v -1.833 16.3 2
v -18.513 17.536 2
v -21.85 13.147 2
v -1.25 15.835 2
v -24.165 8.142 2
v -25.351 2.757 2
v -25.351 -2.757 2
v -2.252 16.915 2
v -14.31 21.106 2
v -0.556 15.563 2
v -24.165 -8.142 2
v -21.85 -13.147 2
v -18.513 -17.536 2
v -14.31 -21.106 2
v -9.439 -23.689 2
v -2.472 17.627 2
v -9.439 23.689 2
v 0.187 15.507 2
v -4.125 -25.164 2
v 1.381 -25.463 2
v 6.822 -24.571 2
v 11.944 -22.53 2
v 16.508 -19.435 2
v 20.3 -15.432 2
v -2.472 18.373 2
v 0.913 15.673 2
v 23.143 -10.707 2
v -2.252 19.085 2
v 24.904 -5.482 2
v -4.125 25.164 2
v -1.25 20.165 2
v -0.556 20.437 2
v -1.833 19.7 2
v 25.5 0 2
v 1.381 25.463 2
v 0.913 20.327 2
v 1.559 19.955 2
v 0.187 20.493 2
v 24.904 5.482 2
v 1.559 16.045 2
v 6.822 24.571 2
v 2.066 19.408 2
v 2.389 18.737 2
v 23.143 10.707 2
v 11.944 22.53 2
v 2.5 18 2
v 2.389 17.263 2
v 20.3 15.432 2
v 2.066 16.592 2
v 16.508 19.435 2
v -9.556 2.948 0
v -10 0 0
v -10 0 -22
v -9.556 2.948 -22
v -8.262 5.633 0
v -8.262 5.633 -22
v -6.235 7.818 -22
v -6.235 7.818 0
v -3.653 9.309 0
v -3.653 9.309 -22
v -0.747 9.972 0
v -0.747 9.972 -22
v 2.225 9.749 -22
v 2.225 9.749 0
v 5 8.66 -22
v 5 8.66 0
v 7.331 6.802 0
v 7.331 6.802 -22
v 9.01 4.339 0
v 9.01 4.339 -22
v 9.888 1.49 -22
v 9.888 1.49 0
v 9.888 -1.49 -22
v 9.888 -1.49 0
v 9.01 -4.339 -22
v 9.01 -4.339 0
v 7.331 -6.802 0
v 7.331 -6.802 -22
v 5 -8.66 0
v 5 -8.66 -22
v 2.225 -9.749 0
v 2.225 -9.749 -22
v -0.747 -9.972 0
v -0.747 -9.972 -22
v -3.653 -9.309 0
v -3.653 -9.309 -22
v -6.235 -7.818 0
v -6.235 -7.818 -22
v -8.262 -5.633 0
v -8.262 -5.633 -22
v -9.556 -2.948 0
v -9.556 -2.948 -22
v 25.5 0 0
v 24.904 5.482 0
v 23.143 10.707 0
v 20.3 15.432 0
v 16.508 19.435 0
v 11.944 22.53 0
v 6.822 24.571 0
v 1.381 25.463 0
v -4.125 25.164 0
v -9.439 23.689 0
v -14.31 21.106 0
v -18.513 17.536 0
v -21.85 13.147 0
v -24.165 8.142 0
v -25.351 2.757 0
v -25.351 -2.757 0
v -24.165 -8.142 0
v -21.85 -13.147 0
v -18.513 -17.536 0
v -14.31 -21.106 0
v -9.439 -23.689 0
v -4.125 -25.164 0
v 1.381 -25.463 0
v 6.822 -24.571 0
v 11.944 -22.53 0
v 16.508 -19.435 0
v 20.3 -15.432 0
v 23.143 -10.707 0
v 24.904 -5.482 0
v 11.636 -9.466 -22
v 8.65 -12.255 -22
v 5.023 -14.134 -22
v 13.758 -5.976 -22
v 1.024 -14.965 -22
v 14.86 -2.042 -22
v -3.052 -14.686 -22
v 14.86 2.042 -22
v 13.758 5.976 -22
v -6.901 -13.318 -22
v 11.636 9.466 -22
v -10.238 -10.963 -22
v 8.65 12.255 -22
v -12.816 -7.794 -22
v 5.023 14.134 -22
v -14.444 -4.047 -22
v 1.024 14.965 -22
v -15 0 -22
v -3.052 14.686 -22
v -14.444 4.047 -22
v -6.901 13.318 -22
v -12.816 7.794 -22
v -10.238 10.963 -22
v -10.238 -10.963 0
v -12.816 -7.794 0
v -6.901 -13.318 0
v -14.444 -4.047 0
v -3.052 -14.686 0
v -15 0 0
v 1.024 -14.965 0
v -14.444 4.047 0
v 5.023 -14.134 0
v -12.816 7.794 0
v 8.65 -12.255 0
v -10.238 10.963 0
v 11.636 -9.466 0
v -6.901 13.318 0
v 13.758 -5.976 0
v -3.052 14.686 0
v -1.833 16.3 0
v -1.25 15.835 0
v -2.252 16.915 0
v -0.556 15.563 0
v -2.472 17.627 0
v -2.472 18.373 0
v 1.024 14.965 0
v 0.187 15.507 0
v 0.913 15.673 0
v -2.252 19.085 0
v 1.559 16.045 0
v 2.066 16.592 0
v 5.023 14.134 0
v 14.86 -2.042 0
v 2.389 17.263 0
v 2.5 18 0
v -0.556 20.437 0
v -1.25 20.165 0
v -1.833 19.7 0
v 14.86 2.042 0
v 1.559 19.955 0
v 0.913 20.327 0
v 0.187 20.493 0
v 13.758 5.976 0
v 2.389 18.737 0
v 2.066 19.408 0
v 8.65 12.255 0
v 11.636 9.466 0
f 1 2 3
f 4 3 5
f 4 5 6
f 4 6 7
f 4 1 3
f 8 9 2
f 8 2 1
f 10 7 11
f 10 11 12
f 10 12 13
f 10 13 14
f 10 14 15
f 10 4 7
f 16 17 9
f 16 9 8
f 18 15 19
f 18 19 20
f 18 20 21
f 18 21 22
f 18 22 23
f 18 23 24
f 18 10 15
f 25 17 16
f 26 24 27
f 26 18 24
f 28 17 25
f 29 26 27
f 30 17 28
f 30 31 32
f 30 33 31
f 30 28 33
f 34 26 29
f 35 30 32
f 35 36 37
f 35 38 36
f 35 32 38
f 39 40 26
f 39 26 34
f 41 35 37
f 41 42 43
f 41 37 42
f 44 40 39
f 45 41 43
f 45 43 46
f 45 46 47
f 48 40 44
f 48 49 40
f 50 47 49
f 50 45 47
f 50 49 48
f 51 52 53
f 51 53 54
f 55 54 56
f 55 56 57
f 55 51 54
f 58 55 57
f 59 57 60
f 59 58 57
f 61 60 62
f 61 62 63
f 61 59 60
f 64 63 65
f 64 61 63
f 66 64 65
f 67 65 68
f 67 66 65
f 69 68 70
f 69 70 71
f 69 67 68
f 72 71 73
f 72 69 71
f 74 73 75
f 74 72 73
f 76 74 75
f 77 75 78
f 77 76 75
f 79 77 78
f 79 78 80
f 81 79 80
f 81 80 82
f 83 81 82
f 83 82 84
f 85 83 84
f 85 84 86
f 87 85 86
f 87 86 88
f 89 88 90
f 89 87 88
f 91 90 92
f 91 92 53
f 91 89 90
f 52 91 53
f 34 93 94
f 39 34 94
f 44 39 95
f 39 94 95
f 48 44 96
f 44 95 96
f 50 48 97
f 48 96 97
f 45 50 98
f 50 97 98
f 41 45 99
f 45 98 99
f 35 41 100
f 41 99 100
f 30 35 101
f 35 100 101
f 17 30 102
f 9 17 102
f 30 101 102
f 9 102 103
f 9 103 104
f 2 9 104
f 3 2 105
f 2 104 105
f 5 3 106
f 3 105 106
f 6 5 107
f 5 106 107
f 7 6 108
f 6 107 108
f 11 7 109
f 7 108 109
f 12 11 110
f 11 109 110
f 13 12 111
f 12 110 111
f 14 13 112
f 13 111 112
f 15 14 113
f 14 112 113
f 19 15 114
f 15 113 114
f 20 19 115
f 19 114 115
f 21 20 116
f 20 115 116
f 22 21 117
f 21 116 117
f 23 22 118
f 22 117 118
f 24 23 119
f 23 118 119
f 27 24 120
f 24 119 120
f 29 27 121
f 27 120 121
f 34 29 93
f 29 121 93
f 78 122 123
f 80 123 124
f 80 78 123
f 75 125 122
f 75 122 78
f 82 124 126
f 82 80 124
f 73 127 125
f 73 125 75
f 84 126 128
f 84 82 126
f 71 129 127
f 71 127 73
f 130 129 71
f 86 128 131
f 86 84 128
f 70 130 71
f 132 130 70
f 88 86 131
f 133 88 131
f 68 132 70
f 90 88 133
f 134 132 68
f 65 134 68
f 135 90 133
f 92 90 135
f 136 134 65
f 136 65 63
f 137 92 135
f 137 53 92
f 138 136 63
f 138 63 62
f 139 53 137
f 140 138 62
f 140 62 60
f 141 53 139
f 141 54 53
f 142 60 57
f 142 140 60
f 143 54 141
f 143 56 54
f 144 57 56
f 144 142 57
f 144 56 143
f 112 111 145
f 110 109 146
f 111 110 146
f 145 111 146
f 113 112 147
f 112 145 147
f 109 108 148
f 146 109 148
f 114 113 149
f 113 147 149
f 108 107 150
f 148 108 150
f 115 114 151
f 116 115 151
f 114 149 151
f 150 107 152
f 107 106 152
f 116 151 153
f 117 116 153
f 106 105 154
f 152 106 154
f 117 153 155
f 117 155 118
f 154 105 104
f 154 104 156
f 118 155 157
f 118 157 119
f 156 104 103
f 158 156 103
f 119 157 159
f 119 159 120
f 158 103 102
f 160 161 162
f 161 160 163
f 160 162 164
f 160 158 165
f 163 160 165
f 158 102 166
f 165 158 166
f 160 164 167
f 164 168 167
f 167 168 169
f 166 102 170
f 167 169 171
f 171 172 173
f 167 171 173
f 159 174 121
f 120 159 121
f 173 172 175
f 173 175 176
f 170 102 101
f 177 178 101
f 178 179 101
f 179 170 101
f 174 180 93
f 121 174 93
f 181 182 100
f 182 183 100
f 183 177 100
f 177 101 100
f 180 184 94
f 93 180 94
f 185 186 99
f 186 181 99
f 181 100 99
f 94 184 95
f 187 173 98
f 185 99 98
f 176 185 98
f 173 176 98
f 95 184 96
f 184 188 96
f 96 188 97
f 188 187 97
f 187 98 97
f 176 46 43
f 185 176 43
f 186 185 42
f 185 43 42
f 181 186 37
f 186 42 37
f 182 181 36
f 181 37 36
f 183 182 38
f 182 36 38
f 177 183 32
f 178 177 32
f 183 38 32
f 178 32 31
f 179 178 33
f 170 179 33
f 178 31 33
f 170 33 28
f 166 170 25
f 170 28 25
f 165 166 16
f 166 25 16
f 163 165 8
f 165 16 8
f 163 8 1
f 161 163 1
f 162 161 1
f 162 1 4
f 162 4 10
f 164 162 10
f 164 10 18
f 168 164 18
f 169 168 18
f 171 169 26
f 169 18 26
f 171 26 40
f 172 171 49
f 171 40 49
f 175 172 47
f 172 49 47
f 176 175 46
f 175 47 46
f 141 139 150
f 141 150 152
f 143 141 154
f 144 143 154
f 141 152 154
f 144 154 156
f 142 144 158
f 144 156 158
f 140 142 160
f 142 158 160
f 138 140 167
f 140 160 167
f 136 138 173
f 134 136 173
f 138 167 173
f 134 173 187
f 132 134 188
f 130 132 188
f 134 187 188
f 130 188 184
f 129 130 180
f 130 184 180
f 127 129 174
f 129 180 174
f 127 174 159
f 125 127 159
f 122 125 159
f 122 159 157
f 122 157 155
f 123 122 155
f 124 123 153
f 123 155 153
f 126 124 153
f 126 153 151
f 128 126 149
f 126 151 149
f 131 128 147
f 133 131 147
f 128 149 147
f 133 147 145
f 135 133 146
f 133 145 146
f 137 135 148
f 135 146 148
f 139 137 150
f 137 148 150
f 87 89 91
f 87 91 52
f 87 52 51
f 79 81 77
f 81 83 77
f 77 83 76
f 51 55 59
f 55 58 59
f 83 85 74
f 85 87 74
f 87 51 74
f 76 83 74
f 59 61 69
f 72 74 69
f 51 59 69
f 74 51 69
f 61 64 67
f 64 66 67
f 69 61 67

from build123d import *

# Parameters (mm, degrees)
ESQUISSE1_R             = 25.5
BOSS_EXTRU_1_DEPTH      = 2
ESQUISSE2_R             = 15
ESQUISSE2_R_2           = 10
BOSS_EXTRU_2_DEPTH      = 22
ESQUISSE3_R             = 2.5
ENL_V_MAT_EXTRU_1_DEPTH = 2


with BuildPart() as part:
    # Esquisse1 → Boss.-Extru.1 (new body)
    with BuildSketch(Plane.XY):
        Circle(ESQUISSE1_R)
    extrude(amount=BOSS_EXTRU_1_DEPTH)

    # Esquisse2 → Boss.-Extru.2 (add)
    with BuildSketch(Plane(origin=(0, 0, 0), x_dir=(-1, 0, 0), z_dir=(0, 0, -1))):
        Circle(ESQUISSE2_R)
        Circle(ESQUISSE2_R_2, mode=Mode.SUBTRACT)
    extrude(amount=BOSS_EXTRU_2_DEPTH)

    # Esquisse3 → Enlèv. mat.-Extru.1 (cut)
    with BuildSketch(Plane.XY.offset(2)):
        with Locations((0, 18)):
            Circle(ESQUISSE3_R)
    extrude(amount=-ENL_V_MAT_EXTRU_1_DEPTH, mode=Mode.SUBTRACT)


solid = part.part
